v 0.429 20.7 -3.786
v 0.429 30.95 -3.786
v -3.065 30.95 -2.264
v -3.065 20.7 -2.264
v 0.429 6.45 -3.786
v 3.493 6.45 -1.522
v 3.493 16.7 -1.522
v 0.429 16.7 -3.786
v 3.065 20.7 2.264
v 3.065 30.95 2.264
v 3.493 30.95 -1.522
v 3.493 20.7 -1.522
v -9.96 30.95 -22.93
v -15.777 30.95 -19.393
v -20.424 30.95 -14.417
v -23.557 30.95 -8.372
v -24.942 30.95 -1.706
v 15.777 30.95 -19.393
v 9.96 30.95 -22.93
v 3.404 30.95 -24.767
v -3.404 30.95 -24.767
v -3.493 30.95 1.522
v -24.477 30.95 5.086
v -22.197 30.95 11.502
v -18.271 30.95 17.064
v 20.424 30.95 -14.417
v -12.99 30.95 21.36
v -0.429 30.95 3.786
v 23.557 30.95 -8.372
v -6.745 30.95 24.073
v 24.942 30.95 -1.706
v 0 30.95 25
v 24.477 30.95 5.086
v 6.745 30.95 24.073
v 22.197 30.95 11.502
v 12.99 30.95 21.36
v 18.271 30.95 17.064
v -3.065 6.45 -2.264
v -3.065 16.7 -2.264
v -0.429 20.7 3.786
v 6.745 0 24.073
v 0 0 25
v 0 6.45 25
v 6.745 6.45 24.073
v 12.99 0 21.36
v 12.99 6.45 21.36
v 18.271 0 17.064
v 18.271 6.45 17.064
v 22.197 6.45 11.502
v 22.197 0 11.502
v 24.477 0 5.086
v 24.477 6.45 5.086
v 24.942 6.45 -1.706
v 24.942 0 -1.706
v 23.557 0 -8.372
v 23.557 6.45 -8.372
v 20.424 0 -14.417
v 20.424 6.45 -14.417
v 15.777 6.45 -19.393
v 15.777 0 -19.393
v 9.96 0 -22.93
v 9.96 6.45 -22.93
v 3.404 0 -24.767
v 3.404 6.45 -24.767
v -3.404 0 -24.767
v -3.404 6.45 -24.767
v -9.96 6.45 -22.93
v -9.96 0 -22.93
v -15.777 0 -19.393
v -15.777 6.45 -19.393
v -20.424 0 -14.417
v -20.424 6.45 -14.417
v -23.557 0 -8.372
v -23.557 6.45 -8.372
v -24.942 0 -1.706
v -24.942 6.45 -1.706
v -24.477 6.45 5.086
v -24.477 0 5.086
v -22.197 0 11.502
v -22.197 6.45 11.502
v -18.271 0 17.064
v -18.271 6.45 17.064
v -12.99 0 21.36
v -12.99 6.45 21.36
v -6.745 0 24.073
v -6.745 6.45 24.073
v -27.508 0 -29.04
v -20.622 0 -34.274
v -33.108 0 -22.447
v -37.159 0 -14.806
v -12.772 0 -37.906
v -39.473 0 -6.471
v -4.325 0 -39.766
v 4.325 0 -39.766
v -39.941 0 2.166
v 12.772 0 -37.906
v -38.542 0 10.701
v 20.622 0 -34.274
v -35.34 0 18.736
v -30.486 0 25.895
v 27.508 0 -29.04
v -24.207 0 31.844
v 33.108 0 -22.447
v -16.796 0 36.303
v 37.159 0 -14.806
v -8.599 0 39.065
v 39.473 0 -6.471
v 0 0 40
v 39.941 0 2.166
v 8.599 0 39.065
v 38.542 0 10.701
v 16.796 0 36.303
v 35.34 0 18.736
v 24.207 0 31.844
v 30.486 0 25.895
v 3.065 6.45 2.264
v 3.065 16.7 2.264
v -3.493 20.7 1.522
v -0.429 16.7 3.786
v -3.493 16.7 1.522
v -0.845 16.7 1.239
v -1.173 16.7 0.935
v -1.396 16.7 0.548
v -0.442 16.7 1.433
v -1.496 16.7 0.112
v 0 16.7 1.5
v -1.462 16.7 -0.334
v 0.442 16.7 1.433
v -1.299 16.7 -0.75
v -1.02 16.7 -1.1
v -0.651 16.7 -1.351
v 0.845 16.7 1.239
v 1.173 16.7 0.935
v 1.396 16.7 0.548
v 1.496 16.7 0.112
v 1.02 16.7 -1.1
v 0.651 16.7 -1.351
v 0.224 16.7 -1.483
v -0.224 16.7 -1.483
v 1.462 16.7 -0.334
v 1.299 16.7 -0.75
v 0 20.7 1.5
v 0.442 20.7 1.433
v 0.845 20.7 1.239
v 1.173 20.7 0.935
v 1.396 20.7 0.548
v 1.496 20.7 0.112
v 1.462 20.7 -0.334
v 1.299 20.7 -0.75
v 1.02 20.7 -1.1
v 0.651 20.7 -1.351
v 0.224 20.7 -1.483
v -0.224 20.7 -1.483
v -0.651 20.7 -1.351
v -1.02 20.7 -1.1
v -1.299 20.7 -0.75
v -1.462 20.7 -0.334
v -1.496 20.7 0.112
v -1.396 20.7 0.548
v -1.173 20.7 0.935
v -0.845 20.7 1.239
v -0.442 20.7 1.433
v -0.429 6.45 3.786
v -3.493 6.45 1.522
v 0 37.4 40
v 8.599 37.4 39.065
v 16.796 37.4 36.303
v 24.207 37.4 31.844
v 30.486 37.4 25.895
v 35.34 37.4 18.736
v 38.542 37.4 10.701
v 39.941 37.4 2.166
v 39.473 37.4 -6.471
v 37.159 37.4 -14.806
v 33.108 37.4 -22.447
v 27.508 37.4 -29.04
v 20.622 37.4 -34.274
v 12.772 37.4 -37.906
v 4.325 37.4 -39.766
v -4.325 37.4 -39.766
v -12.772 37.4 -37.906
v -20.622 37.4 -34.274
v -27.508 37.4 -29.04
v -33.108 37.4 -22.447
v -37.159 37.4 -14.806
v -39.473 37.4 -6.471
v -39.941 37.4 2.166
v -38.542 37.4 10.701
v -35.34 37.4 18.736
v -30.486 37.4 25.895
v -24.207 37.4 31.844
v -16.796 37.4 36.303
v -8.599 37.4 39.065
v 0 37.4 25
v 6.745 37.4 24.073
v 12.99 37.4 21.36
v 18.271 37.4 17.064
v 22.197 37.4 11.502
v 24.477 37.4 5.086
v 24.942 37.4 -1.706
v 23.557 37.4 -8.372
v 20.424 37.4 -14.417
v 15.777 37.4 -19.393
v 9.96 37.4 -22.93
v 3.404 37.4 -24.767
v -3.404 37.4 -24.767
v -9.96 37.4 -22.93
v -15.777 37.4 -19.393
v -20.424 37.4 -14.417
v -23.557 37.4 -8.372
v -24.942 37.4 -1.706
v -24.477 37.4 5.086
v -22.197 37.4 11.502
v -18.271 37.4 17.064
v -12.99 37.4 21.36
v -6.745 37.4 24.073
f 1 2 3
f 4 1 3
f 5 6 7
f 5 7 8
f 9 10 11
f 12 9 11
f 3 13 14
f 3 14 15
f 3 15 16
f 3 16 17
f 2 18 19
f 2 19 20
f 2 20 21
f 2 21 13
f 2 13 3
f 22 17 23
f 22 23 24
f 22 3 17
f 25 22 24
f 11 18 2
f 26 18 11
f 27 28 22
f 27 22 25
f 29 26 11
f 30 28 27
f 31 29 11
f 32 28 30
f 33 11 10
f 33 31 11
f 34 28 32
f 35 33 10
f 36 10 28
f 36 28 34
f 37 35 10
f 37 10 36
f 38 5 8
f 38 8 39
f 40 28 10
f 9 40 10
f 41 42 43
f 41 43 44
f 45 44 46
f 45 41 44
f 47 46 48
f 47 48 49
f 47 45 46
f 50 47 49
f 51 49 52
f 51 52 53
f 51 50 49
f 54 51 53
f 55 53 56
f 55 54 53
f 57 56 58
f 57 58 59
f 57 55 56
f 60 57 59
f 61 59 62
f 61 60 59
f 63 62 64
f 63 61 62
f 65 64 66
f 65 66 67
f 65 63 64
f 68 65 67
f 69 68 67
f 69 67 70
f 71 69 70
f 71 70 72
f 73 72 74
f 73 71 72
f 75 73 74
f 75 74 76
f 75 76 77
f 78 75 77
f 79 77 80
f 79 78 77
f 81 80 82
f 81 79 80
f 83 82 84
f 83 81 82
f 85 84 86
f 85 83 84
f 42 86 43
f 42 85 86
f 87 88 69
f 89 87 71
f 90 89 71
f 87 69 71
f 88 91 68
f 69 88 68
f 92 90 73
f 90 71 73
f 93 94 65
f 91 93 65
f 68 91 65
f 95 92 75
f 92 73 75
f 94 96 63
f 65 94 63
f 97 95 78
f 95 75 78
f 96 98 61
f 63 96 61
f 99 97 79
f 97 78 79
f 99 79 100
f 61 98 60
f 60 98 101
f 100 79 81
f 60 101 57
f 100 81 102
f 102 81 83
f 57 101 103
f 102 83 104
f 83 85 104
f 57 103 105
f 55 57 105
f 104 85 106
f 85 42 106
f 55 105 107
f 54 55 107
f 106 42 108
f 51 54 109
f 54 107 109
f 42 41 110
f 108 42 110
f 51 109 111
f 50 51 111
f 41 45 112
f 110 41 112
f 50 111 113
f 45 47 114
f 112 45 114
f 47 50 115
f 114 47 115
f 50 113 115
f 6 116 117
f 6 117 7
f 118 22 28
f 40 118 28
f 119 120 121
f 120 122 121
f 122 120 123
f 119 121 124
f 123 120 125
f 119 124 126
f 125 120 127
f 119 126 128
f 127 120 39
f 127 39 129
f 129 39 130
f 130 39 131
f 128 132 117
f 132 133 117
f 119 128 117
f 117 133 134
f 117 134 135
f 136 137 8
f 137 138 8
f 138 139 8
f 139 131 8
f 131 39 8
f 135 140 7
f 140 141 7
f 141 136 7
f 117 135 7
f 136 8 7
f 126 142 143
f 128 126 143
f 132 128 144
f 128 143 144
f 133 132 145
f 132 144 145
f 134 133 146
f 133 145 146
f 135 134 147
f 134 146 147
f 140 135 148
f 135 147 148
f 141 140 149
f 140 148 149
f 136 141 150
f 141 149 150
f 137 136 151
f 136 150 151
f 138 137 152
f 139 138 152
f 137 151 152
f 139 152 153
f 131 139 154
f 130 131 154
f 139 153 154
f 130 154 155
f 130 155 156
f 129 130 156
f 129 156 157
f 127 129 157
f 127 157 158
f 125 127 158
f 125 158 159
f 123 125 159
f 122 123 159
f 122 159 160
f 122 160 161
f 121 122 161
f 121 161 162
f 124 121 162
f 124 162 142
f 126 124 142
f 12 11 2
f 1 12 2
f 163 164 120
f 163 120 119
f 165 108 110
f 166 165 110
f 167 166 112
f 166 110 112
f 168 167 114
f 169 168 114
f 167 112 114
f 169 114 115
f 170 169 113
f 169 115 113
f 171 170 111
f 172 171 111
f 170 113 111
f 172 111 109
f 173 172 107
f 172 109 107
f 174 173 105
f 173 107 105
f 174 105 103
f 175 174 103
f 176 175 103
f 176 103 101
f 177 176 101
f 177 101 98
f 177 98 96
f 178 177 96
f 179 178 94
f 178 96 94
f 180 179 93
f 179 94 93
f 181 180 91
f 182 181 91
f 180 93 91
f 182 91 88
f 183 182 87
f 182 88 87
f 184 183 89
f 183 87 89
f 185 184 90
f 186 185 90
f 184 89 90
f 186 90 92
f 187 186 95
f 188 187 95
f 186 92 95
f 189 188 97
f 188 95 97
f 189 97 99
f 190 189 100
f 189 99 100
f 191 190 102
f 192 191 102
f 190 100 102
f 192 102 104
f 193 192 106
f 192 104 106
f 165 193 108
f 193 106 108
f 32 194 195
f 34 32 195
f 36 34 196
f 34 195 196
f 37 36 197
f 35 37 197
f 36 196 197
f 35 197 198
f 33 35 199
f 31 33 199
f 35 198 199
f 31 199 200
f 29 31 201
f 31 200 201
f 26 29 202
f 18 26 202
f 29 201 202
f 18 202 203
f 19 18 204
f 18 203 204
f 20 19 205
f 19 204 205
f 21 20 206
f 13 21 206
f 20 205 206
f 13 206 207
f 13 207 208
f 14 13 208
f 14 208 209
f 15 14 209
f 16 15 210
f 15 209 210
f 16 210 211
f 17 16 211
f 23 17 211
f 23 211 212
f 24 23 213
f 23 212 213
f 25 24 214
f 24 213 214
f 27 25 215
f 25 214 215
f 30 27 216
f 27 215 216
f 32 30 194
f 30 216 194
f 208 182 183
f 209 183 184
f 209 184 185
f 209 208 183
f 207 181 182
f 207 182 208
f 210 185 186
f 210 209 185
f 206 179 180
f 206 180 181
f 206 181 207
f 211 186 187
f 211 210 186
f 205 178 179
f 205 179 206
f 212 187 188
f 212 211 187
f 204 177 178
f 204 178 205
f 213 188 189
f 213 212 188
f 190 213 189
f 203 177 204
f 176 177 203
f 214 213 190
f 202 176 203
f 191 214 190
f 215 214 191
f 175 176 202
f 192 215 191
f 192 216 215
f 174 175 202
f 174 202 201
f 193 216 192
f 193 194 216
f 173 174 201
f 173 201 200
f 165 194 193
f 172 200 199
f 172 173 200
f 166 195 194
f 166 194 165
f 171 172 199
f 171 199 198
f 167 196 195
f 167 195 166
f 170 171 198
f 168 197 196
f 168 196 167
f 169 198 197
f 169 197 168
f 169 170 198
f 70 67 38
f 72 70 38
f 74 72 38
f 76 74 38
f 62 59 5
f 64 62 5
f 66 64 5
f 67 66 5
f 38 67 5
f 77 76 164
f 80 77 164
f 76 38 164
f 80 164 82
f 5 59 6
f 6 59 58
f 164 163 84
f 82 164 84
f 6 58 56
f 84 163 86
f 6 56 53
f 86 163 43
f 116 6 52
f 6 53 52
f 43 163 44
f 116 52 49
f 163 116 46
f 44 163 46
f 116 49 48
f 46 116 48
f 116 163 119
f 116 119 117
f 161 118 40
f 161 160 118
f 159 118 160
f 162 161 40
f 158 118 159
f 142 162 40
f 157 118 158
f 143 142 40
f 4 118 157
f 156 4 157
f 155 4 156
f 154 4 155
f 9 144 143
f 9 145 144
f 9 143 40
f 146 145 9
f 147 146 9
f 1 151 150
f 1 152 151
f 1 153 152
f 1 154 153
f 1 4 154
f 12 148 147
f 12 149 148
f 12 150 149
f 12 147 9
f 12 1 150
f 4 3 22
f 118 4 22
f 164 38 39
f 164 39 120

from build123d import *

# Parameters (mm, degrees)
SKETCH_1_R          = 40
EXTRUDE_1_DEPTH     = 37.4
CUT_EXTRUDE_1_DEPTH = 16.7
SKETCH_3_R          = 25
CUT_EXTRUDE_2_DEPTH = 6.45
SKETCH_4_R          = 1.5
CUT_EXTRUDE_3_DEPTH = 61.236948794


with BuildPart() as part:
    # 草图1 → 凸台-拉伸1 (new body)
    with BuildSketch(Plane(origin=(0, 0, 0), x_dir=(1, 0, 0), z_dir=(0, 1, 0))):
        with Locations(Location((0, 0, 0), (0, 0, 270))):
            Circle(SKETCH_1_R)
    extrude(amount=EXTRUDE_1_DEPTH)

    # 草图2 → 切除-拉伸1 (cut)
    with BuildSketch(Plane(origin=(0, 37.4, 0), x_dir=(1, 0, 0), z_dir=(0, 1, 0))):
        Polygon((3.493353, 1.52200027), (0.428585602, 3.786332577), (-3.064767398, 2.264332307), (-3.493353, -1.52200027), (-0.428585602, -3.786332577), (3.064767398, -2.264332307), align=None)
    cut_extrude_1 = extrude(amount=-CUT_EXTRUDE_1_DEPTH, mode=Mode.SUBTRACT)

    # 草图3 → 切除-拉伸2 (cut)
    with BuildSketch(Plane(origin=(0, 37.4, 0), x_dir=(1, 0, 0), z_dir=(0, 1, 0))):
        with Locations(Location((0, 0, 0), (0, 0, 270))):
            Circle(SKETCH_3_R)
    cut_extrude_2 = extrude(amount=-CUT_EXTRUDE_2_DEPTH, mode=Mode.SUBTRACT)

    # 草图4 → 切除-拉伸3 (cut, through all)
    with BuildSketch(Plane(origin=(0, 20.7, 0), x_dir=(1, 0, 0), z_dir=(0, 1, 0))):
        with Locations(Location((0, 0, 0), (0, 0, 270))):
            Circle(SKETCH_4_R)
    extrude(amount=-CUT_EXTRUDE_3_DEPTH, mode=Mode.SUBTRACT)

    # 镜向3: 切除-拉伸1, 切除-拉伸2 across plane
    add(cut_extrude_1.mirror(Plane.ZX.offset(18.7)), mode=Mode.SUBTRACT)
    add(cut_extrude_2.mirror(Plane.ZX.offset(18.7)), mode=Mode.SUBTRACT)


solid = part.part
